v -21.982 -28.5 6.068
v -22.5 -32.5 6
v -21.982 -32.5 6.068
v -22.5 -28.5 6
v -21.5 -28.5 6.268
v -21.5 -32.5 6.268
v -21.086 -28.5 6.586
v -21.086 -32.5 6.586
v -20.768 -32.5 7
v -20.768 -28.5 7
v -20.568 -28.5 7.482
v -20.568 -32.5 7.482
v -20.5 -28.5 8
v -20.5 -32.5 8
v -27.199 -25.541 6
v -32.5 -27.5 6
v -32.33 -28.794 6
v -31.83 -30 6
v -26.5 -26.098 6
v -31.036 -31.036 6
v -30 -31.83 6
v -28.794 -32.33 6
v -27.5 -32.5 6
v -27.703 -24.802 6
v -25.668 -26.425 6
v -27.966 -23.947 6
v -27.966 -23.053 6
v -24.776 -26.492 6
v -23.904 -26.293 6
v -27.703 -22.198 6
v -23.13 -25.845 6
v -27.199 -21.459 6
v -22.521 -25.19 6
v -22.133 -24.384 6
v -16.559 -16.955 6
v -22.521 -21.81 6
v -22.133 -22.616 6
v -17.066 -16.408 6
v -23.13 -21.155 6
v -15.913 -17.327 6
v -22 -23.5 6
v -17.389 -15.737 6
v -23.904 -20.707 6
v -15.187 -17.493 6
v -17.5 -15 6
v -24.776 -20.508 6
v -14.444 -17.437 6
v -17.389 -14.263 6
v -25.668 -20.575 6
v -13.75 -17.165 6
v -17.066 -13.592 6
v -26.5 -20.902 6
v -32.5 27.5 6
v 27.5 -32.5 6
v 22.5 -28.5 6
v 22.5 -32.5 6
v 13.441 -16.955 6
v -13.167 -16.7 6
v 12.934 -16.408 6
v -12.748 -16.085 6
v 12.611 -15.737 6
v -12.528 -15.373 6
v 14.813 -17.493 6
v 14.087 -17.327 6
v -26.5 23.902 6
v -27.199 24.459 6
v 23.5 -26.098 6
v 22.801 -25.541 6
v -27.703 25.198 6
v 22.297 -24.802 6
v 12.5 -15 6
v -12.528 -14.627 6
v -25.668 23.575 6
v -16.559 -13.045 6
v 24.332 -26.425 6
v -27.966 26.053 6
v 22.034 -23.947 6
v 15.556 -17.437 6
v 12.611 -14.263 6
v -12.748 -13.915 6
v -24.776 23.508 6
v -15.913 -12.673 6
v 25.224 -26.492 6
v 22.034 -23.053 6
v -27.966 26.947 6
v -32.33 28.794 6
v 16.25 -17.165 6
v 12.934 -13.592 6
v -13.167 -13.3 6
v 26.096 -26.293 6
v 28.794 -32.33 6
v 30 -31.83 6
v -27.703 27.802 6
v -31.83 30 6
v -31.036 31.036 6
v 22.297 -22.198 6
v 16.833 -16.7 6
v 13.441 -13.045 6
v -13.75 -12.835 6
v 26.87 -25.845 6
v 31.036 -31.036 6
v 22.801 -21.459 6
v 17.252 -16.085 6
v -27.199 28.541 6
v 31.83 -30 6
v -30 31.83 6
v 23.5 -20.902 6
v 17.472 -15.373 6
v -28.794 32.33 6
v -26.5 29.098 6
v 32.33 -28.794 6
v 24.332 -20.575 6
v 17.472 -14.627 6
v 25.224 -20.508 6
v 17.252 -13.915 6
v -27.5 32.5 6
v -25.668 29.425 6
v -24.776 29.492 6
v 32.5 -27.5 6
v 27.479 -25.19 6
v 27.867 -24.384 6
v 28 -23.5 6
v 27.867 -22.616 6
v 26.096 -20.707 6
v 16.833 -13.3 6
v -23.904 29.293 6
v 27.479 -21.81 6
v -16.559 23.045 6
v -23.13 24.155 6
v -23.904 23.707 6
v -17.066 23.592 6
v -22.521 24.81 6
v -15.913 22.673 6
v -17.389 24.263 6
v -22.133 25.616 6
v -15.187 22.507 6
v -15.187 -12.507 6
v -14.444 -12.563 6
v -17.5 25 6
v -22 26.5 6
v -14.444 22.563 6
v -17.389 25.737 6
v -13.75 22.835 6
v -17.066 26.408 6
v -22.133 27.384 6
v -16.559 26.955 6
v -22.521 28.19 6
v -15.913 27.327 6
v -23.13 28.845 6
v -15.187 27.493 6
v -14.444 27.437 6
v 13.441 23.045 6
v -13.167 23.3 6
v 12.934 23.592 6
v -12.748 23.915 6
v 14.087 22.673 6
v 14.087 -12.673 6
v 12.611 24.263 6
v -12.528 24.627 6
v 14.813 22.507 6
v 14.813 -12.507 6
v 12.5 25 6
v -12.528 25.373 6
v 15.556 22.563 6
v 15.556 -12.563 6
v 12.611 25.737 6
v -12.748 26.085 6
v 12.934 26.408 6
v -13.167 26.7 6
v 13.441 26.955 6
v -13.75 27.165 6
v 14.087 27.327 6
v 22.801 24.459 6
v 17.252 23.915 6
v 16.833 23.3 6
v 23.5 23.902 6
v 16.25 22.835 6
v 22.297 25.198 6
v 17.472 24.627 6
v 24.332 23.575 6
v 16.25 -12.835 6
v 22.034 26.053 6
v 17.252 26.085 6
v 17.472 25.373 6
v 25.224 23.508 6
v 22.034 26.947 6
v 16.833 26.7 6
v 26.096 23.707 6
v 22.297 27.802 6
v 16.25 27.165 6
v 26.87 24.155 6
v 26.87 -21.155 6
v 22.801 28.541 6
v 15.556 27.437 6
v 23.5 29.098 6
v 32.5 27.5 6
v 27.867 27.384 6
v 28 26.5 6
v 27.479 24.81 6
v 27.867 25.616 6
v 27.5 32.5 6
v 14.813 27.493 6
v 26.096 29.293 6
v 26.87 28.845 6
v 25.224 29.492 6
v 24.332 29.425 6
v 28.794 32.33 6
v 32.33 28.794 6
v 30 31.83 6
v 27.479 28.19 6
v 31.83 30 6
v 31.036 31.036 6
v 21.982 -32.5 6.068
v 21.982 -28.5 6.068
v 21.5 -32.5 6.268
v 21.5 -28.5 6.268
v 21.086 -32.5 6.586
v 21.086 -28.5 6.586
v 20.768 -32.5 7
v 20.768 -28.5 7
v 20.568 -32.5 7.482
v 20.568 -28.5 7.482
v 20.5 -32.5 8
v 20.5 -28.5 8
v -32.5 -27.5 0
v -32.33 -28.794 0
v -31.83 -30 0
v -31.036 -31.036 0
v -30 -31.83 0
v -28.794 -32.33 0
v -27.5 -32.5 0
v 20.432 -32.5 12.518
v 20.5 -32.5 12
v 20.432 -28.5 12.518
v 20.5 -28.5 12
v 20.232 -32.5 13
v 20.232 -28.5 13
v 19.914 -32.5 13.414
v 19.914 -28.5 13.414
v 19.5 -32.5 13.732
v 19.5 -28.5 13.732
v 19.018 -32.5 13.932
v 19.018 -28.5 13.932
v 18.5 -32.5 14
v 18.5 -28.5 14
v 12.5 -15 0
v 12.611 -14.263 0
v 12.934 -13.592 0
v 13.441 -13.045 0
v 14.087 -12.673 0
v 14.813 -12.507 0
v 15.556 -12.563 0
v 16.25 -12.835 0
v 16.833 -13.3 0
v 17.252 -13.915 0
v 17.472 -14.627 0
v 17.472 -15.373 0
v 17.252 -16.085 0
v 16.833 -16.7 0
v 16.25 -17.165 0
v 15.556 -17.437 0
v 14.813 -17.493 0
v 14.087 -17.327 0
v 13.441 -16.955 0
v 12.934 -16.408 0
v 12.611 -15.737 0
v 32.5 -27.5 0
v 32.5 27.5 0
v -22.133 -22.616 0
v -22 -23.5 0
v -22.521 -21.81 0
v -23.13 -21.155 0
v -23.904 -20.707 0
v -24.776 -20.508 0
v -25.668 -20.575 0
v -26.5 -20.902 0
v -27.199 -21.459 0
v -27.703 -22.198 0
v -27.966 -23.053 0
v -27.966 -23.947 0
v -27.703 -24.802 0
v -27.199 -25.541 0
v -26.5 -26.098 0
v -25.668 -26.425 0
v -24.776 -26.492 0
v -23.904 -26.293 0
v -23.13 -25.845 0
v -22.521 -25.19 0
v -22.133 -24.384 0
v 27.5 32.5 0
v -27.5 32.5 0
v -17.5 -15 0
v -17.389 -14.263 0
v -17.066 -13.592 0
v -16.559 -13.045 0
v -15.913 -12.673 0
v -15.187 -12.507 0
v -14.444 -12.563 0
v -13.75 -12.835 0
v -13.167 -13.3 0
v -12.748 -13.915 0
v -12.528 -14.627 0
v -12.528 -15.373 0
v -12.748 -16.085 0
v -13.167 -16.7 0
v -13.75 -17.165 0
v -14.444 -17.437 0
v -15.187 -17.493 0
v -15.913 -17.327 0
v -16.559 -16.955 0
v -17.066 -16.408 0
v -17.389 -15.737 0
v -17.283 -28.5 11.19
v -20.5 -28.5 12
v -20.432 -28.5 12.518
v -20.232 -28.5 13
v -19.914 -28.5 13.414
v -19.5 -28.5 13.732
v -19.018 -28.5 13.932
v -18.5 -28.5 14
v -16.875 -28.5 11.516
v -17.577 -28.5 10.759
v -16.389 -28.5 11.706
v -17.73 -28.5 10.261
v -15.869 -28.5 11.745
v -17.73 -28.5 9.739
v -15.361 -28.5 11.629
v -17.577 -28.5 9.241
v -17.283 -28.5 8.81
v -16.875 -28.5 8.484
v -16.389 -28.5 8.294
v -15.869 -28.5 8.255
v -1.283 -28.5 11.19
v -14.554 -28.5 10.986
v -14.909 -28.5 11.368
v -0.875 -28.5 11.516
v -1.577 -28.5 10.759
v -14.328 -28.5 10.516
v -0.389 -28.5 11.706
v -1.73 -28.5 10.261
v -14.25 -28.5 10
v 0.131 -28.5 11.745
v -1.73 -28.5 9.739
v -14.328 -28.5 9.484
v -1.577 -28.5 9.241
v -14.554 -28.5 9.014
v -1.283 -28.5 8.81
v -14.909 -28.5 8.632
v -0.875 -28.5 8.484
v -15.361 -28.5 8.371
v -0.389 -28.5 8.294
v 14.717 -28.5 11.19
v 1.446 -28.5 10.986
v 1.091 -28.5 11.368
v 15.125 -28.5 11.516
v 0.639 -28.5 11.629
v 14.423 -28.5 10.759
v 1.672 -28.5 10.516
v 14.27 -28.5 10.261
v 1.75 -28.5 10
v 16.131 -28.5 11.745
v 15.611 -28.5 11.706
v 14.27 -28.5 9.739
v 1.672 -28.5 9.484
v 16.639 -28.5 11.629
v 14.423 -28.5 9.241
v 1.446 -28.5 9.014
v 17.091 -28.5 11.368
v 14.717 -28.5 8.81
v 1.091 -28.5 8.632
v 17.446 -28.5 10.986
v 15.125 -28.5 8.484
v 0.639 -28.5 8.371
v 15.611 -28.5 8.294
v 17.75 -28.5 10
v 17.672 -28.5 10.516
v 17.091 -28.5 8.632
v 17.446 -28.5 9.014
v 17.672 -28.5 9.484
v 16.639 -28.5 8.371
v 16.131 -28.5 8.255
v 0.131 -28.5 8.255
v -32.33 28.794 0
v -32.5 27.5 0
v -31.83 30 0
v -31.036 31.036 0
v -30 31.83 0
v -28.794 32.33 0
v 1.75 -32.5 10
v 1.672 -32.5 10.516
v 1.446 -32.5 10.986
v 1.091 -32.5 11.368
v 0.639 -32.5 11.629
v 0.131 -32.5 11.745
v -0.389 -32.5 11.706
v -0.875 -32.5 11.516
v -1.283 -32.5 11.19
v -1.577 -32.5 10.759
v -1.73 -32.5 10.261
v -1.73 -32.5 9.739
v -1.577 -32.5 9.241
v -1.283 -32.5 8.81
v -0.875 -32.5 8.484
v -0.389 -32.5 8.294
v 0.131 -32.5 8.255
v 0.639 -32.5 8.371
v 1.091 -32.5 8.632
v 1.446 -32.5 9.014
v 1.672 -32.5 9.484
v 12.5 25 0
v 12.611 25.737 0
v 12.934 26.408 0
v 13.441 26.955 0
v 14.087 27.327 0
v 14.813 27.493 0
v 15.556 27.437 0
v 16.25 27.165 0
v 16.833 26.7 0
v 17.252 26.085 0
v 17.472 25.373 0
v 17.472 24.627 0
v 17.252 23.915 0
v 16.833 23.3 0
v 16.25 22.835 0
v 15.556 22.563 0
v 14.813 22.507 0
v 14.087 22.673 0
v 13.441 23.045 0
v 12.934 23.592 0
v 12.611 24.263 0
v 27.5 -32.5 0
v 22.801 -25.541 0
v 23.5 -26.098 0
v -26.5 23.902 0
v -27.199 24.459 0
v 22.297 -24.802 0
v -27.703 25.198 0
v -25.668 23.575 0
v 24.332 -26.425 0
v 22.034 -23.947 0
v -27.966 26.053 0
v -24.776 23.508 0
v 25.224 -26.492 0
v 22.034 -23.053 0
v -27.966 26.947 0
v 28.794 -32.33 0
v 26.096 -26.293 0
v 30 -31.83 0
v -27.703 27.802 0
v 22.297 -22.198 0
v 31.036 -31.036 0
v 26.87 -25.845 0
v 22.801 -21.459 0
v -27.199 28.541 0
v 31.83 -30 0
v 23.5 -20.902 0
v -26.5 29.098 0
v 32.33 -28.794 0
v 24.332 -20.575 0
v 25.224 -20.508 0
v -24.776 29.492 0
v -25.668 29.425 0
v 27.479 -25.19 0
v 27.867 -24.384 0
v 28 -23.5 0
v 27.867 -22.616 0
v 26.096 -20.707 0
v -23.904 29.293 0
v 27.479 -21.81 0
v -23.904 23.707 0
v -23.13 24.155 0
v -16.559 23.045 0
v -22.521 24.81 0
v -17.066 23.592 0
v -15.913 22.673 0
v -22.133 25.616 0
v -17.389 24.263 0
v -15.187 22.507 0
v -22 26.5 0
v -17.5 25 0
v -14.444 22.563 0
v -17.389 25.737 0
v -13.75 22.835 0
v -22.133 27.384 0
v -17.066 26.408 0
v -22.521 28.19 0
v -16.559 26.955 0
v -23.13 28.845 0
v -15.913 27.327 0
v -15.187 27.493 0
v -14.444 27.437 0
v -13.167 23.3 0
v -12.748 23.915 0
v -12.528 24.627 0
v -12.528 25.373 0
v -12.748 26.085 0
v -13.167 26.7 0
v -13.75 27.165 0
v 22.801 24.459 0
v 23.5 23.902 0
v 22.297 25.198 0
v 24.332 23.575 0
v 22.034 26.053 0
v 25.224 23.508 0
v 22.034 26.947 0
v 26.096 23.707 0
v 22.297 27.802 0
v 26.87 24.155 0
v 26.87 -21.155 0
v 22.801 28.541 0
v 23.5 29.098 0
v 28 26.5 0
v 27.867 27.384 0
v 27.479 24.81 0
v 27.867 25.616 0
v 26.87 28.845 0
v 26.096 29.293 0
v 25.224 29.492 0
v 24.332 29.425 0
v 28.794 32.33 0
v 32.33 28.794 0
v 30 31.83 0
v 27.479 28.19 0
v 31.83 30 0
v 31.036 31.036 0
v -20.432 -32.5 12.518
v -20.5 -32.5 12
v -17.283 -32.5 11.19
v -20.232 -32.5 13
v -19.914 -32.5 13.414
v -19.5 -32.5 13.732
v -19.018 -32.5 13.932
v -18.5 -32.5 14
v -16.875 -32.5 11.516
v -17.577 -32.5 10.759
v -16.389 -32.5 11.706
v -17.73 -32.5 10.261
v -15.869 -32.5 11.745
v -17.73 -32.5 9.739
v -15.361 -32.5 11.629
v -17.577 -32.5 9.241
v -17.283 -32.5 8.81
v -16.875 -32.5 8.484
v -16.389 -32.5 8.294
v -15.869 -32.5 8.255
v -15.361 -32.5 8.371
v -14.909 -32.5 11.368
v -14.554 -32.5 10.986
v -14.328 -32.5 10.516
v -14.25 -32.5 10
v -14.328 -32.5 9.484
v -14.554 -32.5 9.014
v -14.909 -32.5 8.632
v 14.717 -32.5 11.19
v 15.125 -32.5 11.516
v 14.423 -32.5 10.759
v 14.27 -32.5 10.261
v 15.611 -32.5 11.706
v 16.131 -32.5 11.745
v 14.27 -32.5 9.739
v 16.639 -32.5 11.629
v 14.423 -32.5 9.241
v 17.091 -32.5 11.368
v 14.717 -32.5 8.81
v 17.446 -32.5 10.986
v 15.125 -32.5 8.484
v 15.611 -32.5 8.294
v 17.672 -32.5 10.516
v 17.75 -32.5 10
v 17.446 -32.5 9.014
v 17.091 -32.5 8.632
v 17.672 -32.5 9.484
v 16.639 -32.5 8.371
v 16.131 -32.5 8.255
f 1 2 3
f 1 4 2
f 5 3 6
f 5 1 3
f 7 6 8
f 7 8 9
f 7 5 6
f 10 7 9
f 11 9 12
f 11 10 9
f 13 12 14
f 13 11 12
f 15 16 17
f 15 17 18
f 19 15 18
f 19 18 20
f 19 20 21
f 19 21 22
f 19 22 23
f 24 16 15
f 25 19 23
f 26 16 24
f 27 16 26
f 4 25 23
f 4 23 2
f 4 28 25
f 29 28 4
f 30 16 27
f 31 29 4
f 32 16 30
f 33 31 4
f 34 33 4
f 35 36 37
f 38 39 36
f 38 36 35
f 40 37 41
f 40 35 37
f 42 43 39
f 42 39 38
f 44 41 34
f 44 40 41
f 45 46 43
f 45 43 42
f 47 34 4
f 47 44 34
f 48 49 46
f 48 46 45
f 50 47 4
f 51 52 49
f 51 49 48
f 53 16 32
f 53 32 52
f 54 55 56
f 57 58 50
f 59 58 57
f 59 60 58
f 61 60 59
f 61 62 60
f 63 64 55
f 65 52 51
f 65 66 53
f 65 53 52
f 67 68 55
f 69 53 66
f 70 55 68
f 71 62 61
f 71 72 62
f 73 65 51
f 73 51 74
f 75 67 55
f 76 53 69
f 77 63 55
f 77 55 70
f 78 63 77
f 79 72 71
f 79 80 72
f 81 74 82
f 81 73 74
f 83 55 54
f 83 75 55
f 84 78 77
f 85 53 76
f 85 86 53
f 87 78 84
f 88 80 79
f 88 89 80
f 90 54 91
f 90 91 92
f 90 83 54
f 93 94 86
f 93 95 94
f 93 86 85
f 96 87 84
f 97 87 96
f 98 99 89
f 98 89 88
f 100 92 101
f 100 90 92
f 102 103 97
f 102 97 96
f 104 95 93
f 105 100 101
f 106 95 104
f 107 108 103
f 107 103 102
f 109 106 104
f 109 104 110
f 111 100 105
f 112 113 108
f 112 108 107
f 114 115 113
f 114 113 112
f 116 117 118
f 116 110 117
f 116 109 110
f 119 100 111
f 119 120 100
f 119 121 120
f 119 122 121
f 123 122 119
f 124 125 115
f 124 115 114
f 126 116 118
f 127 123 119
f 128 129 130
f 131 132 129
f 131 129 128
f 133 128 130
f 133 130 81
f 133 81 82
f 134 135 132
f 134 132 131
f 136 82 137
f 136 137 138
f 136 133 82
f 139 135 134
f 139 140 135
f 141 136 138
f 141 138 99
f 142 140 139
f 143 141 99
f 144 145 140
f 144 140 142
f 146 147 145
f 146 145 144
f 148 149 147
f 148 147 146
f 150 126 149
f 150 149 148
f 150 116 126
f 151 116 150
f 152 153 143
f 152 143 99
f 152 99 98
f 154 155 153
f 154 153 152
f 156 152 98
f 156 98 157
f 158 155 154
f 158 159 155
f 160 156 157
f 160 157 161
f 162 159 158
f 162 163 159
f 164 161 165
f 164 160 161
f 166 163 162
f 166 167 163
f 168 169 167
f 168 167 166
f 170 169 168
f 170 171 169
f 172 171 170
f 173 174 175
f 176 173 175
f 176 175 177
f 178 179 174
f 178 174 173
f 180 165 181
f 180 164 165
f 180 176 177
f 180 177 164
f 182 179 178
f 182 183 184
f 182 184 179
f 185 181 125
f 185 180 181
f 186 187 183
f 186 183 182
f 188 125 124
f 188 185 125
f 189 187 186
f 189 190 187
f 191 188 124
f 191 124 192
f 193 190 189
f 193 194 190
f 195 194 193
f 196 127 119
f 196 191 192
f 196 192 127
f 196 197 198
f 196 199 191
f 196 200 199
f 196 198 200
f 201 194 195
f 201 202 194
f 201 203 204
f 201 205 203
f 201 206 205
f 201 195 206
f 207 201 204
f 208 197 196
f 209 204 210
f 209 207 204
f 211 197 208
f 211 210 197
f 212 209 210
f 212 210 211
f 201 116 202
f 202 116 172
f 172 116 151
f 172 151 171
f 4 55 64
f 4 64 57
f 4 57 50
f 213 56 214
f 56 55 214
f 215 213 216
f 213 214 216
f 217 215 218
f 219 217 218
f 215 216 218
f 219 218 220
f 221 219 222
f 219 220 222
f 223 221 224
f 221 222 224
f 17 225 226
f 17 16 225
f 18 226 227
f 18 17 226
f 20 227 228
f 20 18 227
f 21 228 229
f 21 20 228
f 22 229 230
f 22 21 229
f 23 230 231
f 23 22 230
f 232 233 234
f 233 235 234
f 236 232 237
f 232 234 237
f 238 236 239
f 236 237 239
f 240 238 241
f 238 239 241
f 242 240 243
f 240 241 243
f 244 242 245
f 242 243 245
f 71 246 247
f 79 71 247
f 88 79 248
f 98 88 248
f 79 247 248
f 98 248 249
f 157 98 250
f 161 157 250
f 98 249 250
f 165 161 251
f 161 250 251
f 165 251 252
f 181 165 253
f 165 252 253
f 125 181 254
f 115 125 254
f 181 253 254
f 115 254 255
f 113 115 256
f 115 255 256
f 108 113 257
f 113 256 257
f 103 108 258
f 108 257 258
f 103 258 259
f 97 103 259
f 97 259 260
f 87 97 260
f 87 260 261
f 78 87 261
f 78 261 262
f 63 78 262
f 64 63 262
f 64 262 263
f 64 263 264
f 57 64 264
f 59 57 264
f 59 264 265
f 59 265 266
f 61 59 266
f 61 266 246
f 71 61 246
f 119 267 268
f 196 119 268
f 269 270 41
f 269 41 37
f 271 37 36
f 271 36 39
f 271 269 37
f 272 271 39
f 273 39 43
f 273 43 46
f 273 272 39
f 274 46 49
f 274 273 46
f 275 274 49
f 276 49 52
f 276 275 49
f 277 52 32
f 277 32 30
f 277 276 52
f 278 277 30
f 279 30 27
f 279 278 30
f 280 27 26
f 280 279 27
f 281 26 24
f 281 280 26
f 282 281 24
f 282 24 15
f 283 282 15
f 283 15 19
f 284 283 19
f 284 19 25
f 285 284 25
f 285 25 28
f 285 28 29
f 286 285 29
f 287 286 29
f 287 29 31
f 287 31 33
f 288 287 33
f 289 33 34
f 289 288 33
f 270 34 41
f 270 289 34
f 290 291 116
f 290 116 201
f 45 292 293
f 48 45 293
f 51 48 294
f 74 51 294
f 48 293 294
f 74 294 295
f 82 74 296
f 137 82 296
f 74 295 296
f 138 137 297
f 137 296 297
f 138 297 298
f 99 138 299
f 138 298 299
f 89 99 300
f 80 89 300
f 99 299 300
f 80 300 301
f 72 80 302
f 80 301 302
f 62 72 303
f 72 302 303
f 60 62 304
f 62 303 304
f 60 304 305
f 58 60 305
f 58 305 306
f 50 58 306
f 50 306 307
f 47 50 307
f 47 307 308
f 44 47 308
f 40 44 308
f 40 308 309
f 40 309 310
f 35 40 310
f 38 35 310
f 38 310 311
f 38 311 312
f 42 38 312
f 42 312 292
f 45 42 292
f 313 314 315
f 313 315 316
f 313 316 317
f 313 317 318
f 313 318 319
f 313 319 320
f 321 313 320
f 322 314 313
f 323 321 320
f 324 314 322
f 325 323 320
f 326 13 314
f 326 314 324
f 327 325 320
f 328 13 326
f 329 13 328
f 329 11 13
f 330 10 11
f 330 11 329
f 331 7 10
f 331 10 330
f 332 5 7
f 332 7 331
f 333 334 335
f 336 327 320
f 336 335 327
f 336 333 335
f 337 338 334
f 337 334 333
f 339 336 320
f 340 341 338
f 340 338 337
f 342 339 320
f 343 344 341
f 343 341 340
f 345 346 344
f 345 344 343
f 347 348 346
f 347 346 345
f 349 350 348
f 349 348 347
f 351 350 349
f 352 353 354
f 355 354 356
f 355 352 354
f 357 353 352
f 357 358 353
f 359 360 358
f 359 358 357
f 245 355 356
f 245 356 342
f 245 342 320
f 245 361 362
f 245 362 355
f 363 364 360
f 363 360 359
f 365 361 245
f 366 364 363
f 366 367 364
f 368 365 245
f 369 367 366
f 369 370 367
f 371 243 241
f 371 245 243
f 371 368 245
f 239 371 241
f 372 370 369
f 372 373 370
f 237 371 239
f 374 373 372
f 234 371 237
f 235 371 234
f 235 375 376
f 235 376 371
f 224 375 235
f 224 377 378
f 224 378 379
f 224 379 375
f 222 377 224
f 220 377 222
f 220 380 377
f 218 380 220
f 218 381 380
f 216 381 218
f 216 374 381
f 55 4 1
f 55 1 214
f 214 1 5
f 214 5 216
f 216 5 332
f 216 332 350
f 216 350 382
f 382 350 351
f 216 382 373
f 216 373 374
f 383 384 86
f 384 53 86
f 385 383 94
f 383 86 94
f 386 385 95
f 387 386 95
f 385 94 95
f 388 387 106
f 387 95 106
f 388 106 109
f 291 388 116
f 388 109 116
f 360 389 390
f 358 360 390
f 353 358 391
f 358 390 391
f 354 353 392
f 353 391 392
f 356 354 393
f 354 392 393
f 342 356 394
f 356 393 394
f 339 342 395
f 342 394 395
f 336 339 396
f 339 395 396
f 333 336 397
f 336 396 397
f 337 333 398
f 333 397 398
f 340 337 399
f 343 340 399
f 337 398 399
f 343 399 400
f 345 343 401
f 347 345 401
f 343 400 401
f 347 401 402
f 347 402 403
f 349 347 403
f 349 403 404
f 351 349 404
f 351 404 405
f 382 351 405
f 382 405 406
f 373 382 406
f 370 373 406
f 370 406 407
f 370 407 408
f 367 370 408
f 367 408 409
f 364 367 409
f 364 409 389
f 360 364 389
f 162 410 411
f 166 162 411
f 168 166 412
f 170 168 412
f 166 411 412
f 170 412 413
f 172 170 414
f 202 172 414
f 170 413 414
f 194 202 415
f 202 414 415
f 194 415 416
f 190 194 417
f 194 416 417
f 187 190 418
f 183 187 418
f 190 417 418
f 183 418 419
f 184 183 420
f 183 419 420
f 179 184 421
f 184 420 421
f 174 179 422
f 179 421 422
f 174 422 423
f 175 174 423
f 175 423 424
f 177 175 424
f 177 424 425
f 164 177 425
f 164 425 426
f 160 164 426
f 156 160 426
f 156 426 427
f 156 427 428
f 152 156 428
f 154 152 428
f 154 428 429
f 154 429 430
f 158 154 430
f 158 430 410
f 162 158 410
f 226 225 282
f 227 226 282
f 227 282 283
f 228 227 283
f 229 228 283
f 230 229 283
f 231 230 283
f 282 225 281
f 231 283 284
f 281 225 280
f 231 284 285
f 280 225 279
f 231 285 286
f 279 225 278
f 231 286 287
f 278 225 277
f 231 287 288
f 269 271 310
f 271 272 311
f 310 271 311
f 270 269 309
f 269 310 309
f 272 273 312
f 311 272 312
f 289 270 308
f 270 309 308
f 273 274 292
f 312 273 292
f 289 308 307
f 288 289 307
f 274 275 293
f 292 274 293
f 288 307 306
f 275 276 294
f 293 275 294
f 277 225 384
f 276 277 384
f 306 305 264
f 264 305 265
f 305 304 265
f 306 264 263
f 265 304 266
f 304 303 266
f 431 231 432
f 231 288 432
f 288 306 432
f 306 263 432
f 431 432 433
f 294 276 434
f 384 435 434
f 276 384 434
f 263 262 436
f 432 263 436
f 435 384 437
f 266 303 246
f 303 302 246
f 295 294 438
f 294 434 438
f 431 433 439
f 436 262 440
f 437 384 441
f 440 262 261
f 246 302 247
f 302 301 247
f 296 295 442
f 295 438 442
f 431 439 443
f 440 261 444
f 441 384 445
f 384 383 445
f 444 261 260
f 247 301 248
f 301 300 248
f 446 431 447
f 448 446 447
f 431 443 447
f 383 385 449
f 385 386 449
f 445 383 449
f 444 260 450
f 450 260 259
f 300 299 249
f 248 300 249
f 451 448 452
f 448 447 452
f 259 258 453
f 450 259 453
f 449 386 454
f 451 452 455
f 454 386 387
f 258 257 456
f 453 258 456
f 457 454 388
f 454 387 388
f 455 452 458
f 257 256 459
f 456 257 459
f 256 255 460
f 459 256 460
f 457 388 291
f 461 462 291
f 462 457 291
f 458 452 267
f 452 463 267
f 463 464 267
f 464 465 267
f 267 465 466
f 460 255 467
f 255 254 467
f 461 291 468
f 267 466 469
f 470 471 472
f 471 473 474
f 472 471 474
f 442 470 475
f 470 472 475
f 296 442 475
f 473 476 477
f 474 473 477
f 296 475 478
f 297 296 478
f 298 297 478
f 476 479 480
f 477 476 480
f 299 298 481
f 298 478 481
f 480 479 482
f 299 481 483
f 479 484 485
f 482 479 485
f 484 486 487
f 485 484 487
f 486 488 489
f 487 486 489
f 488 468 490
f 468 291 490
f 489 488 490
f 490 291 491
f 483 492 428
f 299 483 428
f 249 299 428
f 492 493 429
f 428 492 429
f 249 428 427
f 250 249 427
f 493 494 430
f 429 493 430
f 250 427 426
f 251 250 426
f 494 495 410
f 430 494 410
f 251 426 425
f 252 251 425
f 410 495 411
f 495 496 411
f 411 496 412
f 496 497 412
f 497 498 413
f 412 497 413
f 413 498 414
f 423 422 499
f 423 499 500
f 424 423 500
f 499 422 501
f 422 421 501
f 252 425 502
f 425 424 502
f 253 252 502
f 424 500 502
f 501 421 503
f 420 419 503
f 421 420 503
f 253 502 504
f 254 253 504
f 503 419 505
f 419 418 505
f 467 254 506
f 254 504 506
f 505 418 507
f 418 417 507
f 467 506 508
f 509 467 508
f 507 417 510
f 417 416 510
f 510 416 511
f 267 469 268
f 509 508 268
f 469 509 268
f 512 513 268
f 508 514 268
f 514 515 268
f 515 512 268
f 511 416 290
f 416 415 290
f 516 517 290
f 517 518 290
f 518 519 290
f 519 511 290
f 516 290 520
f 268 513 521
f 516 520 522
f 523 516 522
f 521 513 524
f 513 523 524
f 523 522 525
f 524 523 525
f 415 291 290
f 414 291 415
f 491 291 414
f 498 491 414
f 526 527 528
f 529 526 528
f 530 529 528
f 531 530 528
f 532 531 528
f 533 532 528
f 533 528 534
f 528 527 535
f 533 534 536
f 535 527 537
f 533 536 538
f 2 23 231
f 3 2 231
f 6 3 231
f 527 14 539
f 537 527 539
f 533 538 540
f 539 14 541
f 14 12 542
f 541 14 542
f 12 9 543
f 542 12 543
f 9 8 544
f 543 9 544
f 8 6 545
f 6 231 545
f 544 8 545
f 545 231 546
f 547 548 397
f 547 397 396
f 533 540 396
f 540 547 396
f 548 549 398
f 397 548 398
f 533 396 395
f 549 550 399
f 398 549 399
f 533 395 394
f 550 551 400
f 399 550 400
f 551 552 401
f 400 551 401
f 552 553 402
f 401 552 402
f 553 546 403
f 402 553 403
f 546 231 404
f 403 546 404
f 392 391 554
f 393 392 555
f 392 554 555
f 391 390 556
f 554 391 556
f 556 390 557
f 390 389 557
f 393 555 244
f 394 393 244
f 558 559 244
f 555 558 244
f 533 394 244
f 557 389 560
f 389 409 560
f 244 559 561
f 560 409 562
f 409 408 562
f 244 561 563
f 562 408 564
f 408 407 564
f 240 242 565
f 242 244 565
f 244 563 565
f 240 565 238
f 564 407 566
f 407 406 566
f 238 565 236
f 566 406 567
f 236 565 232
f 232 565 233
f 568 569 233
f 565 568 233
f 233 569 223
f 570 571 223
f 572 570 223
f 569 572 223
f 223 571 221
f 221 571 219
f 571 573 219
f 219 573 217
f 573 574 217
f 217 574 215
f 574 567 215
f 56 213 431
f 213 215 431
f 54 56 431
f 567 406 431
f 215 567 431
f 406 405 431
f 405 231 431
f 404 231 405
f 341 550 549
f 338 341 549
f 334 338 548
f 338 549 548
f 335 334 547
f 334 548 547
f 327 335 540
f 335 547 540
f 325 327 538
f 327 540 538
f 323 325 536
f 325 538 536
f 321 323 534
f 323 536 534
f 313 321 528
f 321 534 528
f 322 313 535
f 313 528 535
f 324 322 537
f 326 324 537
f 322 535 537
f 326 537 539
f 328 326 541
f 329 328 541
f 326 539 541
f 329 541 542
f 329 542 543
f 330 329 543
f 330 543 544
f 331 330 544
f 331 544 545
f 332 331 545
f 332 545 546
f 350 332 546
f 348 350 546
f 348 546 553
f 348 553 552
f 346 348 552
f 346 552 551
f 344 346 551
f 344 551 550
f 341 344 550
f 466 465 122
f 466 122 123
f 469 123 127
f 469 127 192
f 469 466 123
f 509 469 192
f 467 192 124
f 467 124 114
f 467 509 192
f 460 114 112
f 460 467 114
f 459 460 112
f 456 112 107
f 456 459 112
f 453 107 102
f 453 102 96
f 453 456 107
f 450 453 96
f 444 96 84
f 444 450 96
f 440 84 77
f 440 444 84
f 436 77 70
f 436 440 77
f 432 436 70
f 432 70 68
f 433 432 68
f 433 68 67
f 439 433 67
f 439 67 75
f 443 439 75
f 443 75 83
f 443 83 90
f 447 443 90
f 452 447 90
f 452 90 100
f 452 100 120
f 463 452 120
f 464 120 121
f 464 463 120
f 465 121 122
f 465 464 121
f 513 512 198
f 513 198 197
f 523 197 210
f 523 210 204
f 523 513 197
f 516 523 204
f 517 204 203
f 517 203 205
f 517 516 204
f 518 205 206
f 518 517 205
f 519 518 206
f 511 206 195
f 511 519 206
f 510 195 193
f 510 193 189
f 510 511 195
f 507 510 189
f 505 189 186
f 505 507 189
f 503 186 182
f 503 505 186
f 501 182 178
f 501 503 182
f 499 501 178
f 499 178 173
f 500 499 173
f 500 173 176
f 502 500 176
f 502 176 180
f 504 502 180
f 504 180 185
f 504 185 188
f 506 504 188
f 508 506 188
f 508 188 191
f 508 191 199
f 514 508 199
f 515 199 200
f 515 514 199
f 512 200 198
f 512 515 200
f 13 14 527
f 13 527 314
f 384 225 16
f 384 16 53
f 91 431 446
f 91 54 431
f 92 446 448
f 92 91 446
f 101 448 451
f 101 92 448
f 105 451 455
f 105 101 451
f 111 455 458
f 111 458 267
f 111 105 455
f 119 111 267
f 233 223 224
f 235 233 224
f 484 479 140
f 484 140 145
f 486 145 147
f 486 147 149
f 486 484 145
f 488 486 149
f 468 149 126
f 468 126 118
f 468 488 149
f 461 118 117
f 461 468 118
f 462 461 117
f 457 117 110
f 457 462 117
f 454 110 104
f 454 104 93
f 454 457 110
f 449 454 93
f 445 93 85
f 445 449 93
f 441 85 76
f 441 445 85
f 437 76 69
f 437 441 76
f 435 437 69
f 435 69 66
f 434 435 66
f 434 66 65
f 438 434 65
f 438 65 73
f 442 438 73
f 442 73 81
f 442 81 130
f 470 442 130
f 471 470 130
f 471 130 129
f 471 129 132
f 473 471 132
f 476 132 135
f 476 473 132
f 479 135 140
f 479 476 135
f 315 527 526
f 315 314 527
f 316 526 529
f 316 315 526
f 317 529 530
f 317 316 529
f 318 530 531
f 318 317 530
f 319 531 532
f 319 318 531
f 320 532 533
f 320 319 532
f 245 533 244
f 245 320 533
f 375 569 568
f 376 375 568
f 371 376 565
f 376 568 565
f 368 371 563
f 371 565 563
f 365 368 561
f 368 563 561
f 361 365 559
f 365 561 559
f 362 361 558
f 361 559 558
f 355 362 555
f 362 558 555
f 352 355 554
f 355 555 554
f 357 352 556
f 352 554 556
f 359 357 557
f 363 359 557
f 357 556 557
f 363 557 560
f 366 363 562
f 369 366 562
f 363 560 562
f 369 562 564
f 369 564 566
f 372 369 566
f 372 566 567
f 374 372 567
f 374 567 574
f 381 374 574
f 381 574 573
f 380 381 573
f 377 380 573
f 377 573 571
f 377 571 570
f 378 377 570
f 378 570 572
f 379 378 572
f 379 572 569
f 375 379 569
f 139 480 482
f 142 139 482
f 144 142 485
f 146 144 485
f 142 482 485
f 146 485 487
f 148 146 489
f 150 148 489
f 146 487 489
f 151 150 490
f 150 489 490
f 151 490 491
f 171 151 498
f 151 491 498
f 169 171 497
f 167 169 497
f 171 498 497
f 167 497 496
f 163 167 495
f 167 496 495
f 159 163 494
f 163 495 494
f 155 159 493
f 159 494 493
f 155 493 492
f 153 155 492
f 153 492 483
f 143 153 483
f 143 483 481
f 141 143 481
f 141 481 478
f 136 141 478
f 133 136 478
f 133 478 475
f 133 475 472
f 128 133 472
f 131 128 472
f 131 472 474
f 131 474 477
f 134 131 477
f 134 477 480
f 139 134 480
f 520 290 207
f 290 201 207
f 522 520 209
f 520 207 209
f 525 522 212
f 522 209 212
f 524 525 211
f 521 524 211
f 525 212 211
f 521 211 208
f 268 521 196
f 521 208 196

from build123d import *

# Parameters (mm, degrees)
SKETCH1_W           = 65
SKETCH1_H           = 65
SKETCH1_R           = 3
BOSS_EXTRUDE1_DEPTH = 6
FILLET1_R           = 5
SKETCH2_W           = 41
SKETCH2_H           = 4
BOSS_EXTRUDE2_DEPTH = 8
FILLET2_R           = 2
SKETCH3_R           = 2.5
CUT_EXTRUDE1_DEPTH  = 15
SKETCH_1_R          = 1.75
CUT_EXTRUDE_1_DEPTH = 66


with BuildPart() as part:
    # Sketch1 → Boss-Extrude1 (new body)
    with BuildSketch(Plane.XY):
        Rectangle(SKETCH1_W, SKETCH1_H)
        with Locations((25, 26.5)):
            Circle(SKETCH1_R, mode=Mode.SUBTRACT)
        with Locations((25, -23.5)):
            Circle(SKETCH1_R, mode=Mode.SUBTRACT)
        with Locations((-25, -23.5)):
            Circle(SKETCH1_R, mode=Mode.SUBTRACT)
        with Locations((-25, 26.5)):
            Circle(SKETCH1_R, mode=Mode.SUBTRACT)
    extrude(amount=BOSS_EXTRUDE1_DEPTH)

    # Fillet1
    fillet1_edges = [part.edges().sort_by_distance(p)[0] for p in [
        (32.5, -32.5, 3),
        (-32.5, -32.5, 3),
        (-32.5, 32.5, 3),
        (32.5, 32.5, 3),
    ]]
    fillet(fillet1_edges, radius=FILLET1_R)

    # Sketch2 → Boss-Extrude2 (add)
    with BuildSketch(Plane.XY.offset(6)):
        with Locations((0, -30.5)):
            Rectangle(SKETCH2_W, SKETCH2_H)
    extrude(amount=BOSS_EXTRUDE2_DEPTH)

    # Fillet2
    fillet2_edges = [part.edges().sort_by_distance(p)[0] for p in [
        (-20.5, -30.5, 6),
        (20.5, -30.5, 6),
        (-20.5, -30.5, 14),
        (20.5, -30.5, 14),
    ]]
    fillet(fillet2_edges, radius=FILLET2_R)

    # Sketch3 → Cut-Extrude1 (cut, through all)
    with BuildSketch(Plane(origin=(0, 0, 0), x_dir=(-1, 0, 0), z_dir=(0, 0, -1))):
        with Locations((-15, 25)):
            Circle(SKETCH3_R)
        with Locations((15, 25)):
            Circle(SKETCH3_R)
        with Locations((-15, -15)):
            Circle(SKETCH3_R)
        with Locations((15, -15)):
            Circle(SKETCH3_R)
    extrude(amount=-CUT_EXTRUDE1_DEPTH, mode=Mode.SUBTRACT)

    # 草图1 → 切除-拉伸1 (cut, through all)
    with BuildSketch(Plane.XZ.offset(32.5)):
        with Locations((-16, 10)):
            Circle(SKETCH_1_R)
        with Locations((0, 10)):
            Circle(SKETCH_1_R)
        with Locations((16, 10)):
            Circle(SKETCH_1_R)
    extrude(amount=-CUT_EXTRUDE_1_DEPTH, mode=Mode.SUBTRACT)


solid = part.part
